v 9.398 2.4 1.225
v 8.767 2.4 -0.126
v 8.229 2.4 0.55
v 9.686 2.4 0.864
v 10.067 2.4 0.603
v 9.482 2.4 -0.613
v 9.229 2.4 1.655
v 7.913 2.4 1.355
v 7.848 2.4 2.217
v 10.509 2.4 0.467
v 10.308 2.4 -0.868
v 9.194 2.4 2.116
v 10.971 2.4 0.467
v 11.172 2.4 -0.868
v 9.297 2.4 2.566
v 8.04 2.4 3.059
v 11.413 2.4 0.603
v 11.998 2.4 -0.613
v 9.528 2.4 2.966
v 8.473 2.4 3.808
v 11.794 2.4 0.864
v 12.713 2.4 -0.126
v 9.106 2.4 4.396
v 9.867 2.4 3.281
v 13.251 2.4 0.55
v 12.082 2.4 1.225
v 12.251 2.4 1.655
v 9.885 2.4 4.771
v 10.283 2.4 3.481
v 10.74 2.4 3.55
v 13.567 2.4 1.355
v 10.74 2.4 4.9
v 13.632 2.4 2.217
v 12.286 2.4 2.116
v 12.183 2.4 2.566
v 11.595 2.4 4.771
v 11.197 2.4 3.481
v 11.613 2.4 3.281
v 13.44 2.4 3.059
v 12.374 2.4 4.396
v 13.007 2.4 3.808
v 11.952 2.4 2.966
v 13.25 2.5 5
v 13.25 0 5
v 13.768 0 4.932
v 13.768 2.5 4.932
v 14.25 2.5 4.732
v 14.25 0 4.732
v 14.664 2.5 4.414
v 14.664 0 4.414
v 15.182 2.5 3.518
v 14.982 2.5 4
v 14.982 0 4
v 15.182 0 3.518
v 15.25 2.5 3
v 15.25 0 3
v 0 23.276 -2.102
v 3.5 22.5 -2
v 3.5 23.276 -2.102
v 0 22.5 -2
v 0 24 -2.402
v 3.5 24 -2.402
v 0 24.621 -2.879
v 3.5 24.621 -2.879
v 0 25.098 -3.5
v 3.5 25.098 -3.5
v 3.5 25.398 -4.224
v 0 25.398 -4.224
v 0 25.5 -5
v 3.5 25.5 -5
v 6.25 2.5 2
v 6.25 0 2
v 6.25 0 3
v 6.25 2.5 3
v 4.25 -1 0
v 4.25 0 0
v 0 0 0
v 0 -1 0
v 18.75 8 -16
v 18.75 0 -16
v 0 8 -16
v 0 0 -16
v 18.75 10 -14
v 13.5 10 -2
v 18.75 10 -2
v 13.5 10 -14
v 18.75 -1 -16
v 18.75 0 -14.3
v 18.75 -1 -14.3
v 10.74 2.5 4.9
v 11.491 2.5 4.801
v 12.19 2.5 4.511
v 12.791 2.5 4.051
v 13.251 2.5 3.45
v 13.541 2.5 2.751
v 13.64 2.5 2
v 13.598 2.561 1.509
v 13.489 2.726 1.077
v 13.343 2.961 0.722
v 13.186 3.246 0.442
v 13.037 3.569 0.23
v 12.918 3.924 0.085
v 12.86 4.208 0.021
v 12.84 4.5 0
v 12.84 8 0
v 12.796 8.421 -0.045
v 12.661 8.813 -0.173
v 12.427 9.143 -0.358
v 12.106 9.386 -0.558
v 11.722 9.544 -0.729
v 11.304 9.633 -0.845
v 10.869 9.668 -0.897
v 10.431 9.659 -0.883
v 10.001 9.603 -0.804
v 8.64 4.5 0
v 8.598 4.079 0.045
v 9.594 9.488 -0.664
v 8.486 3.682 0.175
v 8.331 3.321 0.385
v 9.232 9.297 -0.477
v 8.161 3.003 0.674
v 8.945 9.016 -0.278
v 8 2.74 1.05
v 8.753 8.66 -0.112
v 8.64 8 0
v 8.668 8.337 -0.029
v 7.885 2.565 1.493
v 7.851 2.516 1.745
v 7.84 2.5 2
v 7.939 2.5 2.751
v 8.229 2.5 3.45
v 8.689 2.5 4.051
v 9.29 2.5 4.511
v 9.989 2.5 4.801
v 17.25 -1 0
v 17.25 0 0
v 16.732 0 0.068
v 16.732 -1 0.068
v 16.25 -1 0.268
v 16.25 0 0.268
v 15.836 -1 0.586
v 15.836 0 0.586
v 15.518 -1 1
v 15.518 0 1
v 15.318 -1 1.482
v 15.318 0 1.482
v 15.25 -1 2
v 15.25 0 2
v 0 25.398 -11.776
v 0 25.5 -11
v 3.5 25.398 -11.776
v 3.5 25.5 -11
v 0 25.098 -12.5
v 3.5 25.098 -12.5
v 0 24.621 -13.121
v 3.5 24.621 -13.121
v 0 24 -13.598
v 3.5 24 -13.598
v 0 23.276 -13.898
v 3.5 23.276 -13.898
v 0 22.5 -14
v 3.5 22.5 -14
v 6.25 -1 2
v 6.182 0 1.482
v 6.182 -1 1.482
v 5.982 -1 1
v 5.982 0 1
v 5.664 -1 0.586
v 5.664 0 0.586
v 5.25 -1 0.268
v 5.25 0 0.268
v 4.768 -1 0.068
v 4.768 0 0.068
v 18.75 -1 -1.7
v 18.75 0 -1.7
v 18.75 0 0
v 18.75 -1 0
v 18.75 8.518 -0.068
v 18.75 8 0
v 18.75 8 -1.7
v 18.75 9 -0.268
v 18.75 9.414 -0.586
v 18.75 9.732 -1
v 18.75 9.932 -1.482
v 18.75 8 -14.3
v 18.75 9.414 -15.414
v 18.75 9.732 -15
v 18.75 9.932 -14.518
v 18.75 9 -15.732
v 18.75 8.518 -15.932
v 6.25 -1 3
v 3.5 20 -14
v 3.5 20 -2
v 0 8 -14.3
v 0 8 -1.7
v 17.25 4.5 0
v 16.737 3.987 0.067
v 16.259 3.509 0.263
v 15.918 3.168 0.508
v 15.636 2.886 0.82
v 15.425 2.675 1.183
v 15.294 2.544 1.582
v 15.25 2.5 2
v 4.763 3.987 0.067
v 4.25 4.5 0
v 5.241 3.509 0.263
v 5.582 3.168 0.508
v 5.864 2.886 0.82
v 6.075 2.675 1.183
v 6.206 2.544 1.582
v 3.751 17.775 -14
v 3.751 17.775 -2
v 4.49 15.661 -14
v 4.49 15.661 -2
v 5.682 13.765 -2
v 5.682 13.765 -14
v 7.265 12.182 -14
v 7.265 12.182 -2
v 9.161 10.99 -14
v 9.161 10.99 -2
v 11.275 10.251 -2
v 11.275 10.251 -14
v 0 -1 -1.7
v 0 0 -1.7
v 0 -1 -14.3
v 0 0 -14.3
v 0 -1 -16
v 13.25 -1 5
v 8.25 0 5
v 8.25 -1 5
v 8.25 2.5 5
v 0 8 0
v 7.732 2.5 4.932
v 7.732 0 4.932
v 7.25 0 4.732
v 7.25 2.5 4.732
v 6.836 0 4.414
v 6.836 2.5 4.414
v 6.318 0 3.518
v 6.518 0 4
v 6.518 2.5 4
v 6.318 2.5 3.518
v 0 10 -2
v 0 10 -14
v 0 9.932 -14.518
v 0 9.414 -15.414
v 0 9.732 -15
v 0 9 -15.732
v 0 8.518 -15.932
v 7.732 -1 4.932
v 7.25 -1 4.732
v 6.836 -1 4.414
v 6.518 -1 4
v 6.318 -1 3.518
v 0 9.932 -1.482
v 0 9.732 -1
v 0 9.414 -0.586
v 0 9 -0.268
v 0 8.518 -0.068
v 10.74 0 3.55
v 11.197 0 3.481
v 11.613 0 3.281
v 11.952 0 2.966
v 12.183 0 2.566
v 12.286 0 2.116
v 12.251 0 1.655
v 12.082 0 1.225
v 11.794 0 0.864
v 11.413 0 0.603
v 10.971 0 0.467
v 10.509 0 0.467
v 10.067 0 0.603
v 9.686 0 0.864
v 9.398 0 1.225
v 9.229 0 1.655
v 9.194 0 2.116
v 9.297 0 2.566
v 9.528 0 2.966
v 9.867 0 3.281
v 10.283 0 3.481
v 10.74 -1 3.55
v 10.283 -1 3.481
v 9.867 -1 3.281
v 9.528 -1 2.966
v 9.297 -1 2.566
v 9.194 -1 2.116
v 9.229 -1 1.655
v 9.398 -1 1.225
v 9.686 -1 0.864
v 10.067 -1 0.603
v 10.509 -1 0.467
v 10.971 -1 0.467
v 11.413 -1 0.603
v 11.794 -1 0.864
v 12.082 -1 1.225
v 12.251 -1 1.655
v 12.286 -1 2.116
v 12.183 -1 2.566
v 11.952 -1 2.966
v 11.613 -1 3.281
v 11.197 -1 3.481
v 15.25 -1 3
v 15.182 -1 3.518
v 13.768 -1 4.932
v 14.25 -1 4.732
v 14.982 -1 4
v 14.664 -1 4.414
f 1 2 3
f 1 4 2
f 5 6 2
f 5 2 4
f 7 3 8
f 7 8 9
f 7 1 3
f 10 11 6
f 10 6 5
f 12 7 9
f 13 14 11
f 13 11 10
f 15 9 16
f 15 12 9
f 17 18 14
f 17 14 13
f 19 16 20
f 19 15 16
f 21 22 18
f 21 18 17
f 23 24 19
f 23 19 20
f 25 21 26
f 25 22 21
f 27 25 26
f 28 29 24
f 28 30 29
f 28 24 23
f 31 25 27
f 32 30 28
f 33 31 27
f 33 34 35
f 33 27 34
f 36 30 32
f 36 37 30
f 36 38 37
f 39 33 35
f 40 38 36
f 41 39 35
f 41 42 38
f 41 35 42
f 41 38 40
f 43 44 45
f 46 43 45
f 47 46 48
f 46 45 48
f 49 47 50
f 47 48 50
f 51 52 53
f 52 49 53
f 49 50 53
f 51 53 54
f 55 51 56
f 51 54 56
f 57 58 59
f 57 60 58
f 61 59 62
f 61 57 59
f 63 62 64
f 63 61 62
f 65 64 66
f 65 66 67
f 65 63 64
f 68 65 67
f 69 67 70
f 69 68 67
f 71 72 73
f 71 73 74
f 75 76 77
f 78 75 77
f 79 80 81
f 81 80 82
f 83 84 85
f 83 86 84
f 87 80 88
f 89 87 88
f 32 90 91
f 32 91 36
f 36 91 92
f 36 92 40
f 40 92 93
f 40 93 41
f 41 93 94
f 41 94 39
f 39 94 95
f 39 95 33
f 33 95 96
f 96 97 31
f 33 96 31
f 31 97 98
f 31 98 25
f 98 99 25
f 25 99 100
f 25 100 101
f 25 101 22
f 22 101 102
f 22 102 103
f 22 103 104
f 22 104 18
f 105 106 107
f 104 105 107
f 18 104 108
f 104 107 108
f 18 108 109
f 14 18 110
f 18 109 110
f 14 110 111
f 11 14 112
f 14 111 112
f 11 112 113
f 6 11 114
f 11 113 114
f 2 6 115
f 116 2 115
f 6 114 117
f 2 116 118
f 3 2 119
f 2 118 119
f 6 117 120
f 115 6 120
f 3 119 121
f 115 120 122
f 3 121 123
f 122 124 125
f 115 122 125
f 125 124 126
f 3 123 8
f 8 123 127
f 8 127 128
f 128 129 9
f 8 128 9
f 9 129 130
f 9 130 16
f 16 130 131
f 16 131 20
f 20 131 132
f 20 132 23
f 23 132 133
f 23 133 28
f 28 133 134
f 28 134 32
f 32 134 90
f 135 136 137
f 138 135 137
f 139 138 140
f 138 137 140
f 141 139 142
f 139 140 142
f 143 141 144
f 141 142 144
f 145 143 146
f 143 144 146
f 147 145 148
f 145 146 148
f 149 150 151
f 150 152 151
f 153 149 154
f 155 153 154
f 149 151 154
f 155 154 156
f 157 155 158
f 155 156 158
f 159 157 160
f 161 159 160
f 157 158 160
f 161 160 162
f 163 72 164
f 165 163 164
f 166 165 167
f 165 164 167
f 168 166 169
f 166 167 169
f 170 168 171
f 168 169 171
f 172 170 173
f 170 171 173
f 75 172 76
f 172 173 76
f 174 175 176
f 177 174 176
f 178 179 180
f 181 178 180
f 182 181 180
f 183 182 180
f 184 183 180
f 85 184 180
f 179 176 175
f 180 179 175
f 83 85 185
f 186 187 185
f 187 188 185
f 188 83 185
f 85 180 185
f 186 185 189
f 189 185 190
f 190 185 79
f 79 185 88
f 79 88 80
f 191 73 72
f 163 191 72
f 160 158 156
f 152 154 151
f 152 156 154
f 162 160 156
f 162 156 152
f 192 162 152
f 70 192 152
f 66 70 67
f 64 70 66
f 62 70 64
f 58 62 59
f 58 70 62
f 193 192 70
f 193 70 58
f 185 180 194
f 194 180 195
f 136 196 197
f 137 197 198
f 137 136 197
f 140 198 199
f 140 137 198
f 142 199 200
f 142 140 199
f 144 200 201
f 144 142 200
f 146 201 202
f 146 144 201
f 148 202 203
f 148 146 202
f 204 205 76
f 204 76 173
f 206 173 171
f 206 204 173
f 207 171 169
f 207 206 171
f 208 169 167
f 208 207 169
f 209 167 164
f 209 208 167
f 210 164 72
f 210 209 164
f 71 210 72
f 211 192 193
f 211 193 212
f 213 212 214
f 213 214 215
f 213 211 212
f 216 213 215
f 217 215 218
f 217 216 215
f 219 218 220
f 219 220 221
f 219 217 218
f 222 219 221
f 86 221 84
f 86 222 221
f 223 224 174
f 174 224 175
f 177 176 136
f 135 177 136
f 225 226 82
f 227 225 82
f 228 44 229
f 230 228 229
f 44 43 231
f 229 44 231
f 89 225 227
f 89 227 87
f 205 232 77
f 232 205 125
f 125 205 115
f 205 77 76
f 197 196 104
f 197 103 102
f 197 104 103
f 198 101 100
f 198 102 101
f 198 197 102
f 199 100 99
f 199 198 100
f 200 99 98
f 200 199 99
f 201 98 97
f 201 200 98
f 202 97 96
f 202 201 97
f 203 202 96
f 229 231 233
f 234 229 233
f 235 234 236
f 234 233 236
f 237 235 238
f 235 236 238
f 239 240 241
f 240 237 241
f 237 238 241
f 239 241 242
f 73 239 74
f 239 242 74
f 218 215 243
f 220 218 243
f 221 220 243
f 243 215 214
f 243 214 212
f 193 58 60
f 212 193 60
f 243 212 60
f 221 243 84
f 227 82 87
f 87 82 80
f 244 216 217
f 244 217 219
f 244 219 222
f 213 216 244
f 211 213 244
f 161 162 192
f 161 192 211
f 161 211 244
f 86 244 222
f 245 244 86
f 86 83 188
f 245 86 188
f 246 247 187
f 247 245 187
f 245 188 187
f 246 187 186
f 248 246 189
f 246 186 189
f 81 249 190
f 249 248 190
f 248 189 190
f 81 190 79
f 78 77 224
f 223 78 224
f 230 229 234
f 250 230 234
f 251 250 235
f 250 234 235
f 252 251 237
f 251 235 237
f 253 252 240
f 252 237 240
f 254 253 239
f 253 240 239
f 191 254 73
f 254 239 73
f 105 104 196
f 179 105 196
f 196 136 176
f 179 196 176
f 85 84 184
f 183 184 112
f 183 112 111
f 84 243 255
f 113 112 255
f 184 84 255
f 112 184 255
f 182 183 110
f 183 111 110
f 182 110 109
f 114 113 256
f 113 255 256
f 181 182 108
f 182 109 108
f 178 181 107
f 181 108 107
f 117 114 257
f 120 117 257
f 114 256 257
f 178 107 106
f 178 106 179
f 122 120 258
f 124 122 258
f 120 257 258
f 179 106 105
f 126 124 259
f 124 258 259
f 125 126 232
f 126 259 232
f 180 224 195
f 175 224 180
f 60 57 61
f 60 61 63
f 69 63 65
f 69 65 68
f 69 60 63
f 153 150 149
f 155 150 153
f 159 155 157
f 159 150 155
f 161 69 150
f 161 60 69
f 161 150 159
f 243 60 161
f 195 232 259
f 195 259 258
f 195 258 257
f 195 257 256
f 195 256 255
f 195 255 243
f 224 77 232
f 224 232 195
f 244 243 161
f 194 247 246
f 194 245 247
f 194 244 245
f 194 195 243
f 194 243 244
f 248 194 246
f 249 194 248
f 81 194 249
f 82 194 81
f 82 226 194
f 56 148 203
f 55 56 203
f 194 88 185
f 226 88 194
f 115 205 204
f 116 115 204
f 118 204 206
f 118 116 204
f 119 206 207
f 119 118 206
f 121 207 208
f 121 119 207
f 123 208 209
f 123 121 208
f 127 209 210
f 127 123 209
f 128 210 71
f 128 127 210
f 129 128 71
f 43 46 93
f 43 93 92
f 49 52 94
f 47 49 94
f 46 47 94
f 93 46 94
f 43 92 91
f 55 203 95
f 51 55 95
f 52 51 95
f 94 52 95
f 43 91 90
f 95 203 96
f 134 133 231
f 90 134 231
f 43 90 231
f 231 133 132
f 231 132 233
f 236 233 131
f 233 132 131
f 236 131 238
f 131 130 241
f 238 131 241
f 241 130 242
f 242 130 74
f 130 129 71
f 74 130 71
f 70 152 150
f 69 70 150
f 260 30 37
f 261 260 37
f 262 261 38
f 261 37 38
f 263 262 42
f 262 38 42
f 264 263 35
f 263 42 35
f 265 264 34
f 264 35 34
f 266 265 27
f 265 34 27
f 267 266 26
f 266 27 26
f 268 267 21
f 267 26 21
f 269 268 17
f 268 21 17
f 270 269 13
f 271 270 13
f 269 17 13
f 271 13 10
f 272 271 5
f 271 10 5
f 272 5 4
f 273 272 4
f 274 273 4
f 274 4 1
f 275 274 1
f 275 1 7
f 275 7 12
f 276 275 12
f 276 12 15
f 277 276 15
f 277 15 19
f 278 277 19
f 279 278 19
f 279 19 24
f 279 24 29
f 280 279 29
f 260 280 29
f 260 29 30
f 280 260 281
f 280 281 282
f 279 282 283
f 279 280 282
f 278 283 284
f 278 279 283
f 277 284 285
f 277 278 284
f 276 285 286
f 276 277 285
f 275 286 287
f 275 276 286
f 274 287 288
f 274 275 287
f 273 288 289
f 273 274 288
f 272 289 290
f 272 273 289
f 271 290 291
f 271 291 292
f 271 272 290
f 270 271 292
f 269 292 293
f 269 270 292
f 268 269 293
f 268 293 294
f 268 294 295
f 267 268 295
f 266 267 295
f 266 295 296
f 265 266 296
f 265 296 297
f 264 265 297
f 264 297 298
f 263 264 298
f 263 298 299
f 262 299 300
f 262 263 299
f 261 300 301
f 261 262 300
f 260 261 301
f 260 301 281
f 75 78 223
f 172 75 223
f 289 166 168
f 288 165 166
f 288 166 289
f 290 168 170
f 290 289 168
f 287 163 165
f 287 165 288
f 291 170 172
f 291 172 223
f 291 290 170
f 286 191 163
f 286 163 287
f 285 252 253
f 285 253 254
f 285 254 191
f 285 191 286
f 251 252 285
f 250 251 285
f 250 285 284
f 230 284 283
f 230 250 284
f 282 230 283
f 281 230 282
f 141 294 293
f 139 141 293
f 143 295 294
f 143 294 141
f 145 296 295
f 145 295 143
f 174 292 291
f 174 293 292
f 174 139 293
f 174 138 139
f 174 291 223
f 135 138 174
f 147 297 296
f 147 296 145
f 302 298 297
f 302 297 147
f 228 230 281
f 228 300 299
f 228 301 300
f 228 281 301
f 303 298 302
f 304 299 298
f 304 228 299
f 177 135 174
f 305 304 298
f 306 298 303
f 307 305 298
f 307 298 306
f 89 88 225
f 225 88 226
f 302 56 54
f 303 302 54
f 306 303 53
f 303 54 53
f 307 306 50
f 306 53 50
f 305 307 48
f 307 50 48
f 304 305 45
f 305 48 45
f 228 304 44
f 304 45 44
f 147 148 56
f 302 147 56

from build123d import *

# Parameters (mm, degrees)
SALIENTE_EXTRUIR1_DEPTH = 10
CORTAR_EXTRUIR1_DEPTH   = 8
CROQUIS3_W              = 9
CROQUIS3_H              = 2.5
SALIENTE_EXTRUIR2_DEPTH = 5
CROQUIS4_R              = 1.5499999999999994
CORTAR_EXTRUIR2_DEPTH   = 2.5
REDONDEO1_R             = 2
CROQUIS5_R              = 2.9
CORTAR_EXTRUIR3_DEPTH   = 7.6
SALIENTE_EXTRUIR3_DEPTH = 15.5
REDONDEO2_R             = 10
REDONDEO3_R             = 3
CROQUIS8_R              = 1.5499999999999994
SALIENTE_EXTRUIR5_DEPTH = 1
CROQUIS9_W              = 5
CROQUIS9_H              = 1.700000000000001
CORTAR_EXTRUIR4_DEPTH   = 36.46565245064583


with BuildPart() as part:
    # Croquis1 → Saliente-Extruir1 (new body)
    with BuildSketch(Plane(origin=(0, 0, 0), x_dir=(1, 0, 0), z_dir=(0, 1, 0))):
        Polygon((0, 0), (18.75, 0), (18.749999999999996, 16), (-3.47e-15, 16), align=None)
    extrude(amount=SALIENTE_EXTRUIR1_DEPTH)

    # Croquis2 → Cortar-Extruir1 (cut)
    with BuildSketch(Plane.XZ):
        Polygon((0, -1.7000000000000002), (18.749999999999993, -1.6999999999999997), (18.749999999999996, -14.3), (1.51e-15, -14.3), align=None)
    extrude(amount=-CORTAR_EXTRUIR1_DEPTH, mode=Mode.SUBTRACT)

    # Croquis3 → Saliente-Extruir2 (add)
    with BuildSketch(Plane.XY):
        with Locations((10.750000000000002, 1.25)):
            Rectangle(CROQUIS3_W, CROQUIS3_H)
    extrude(amount=SALIENTE_EXTRUIR2_DEPTH)

    # Croquis4 → Cortar-Extruir2 (cut)
    with BuildSketch(Plane(origin=(0, 2.5, 0), x_dir=(1, 0, 0), z_dir=(0, 1, 0))):
        with Locations(Location((10.74, -2, 0), (0, 0, 270))):
            Circle(CROQUIS4_R)
    extrude(amount=-CORTAR_EXTRUIR2_DEPTH, mode=Mode.SUBTRACT)

    # Redondeo1
    # the kernel refuses this fillet: 2 mm, written as the material it adds along each edge
    with BuildSketch(Plane(origin=(6.25, 2.5, 0), x_dir=(-1, 0, 0), z_dir=(0, -1, 0))) as redondeo1_piece_1:
        with BuildLine():
            CenterArc((REDONDEO1_R, -REDONDEO1_R), REDONDEO1_R, 90, 90)
            Line((0, -REDONDEO1_R), (0, 0))
            Line((0, 0), (REDONDEO1_R, 0))
        make_face()
    extrude(amount=2.5)
    with BuildSketch(Plane(origin=(15.25, 0, 0), x_dir=(1, 0, 0), z_dir=(0, 1, 0))) as redondeo1_piece_2:
        with BuildLine():
            CenterArc((REDONDEO1_R, -REDONDEO1_R), REDONDEO1_R, 90, 90)
            Line((0, -REDONDEO1_R), (0, 0))
            Line((0, 0), (REDONDEO1_R, 0))
        make_face()
    extrude(amount=2.5)
    with BuildSketch(Plane(origin=(15.25, 2.5, 0), x_dir=(0, 1, 0), z_dir=(-1, 0, 0))) as redondeo1_piece_3_section:
        with BuildLine():
            CenterArc((REDONDEO1_R, -REDONDEO1_R), REDONDEO1_R, 90, 90)
            Line((0, -REDONDEO1_R), (0, 0))
            Line((0, 0), (REDONDEO1_R, 0))
        make_face()
    redondeo1_piece_3 = extrude(amount=9, mode=Mode.PRIVATE)
    redondeo1_piece_3 = redondeo1_piece_3 - Plane(origin=(10.74, 2.981912580650479, 2), x_dir=(-1.8e-16, 0, 1), z_dir=(0, 1, 0)) * Cylinder(1.5499999999999994, 26, mode=Mode.PRIVATE)
    add(redondeo1_piece_3)
    with BuildSketch(Plane(origin=(6.25, 7.5, 0), x_dir=(-1, 0, 0), z_dir=(0, -1, 0))) as redondeo1_piece_4a_section:
        with BuildLine():
            CenterArc((REDONDEO1_R, -REDONDEO1_R), REDONDEO1_R, 90, 90)
            Line((0, -REDONDEO1_R), (0, 0))
            Line((0, 0), (REDONDEO1_R, 0))
        make_face()
    redondeo1_piece_4a = extrude(amount=7.5, mode=Mode.PRIVATE)
    redondeo1_piece_4a = split(redondeo1_piece_4a, bisect_by=Plane(origin=(5.797209771466349, 2.5, 0.45279022853365075), z_dir=(0, 1, 0)), keep=Keep.TOP, mode=Mode.PRIVATE)
    with BuildSketch(Plane(origin=(15.25, 2.5, 0), x_dir=(0, 1, 0), z_dir=(-1, 0, 0))) as redondeo1_piece_4b_section:
        with BuildLine():
            CenterArc((REDONDEO1_R, -REDONDEO1_R), REDONDEO1_R, 90, 90)
            Line((0, -REDONDEO1_R), (0, 0))
            Line((0, 0), (REDONDEO1_R, 0))
        make_face()
    redondeo1_piece_4b = extrude(amount=14, mode=Mode.PRIVATE)
    redondeo1_piece_4b = split(redondeo1_piece_4b, bisect_by=Plane(origin=(6.25, 2.952790228533651, 0.45279022853365075), z_dir=(-1, 0, 0)), keep=Keep.TOP, mode=Mode.PRIVATE)
    redondeo1_piece_4 = redondeo1_piece_4a & redondeo1_piece_4b
    add(redondeo1_piece_4)
    with BuildSketch(Plane(origin=(20.25, 2.5, 0), x_dir=(0, 1, 0), z_dir=(-1, 0, 0))) as redondeo1_piece_5a_section:
        with BuildLine():
            CenterArc((REDONDEO1_R, -REDONDEO1_R), REDONDEO1_R, 90, 90)
            Line((0, -REDONDEO1_R), (0, 0))
            Line((0, 0), (REDONDEO1_R, 0))
        make_face()
    redondeo1_piece_5a = extrude(amount=14, mode=Mode.PRIVATE)
    redondeo1_piece_5a = split(redondeo1_piece_5a, bisect_by=Plane(origin=(18.75, 2.952790228533651, 0.45279022853365036), z_dir=(-1, 0, 2.2e-16)), keep=Keep.TOP, mode=Mode.PRIVATE)
    redondeo1_piece_5a = split(redondeo1_piece_5a, bisect_by=Plane(origin=(15.25, 2.952790228533651, 0.45279022853365075), z_dir=(1, 0, 0)), keep=Keep.TOP, mode=Mode.PRIVATE)
    with BuildSketch(Plane(origin=(15.25, 0, 0), x_dir=(1, 0, 0), z_dir=(0, 1, 0))) as redondeo1_piece_5b_section:
        with BuildLine():
            CenterArc((REDONDEO1_R, -REDONDEO1_R), REDONDEO1_R, 90, 90)
            Line((0, -REDONDEO1_R), (0, 0))
            Line((0, 0), (REDONDEO1_R, 0))
        make_face()
    redondeo1_piece_5b = extrude(amount=7.5, mode=Mode.PRIVATE)
    redondeo1_piece_5b = split(redondeo1_piece_5b, bisect_by=Plane(origin=(15.70279022853365, 2.5, 0.45279022853364964), z_dir=(0, 1, 0)), keep=Keep.TOP, mode=Mode.PRIVATE)
    redondeo1_piece_5 = redondeo1_piece_5a & redondeo1_piece_5b
    add(redondeo1_piece_5)
    # the kernel refuses this fillet: 2 mm, written as the material it takes off along each edge
    with BuildSketch(Plane(origin=(23.749999999999996, 10, -16), x_dir=(0, -1, 0), z_dir=(-1, 0, 0))) as redondeo1_2_piece_1:
        with BuildLine():
            CenterArc((REDONDEO1_R, REDONDEO1_R), REDONDEO1_R, 180, 90)
            Line((0, REDONDEO1_R), (0, 0))
            Line((0, 0), (REDONDEO1_R, 0))
        make_face()
    extrude(amount=28.75, mode=Mode.SUBTRACT)
    with BuildSketch(Plane(origin=(6.25, 7.5, 5), x_dir=(0, 0, -1), z_dir=(0, -1, 0))) as redondeo1_2_piece_2:
        with BuildLine():
            CenterArc((REDONDEO1_R, REDONDEO1_R), REDONDEO1_R, 180, 90)
            Line((0, REDONDEO1_R), (0, 0))
            Line((0, 0), (REDONDEO1_R, 0))
        make_face()
    extrude(amount=12.5, mode=Mode.SUBTRACT)
    with BuildSketch(Plane(origin=(15.25, -5, 5), x_dir=(0, 0, -1), z_dir=(0, 1, 0))) as redondeo1_2_piece_3:
        with BuildLine():
            CenterArc((REDONDEO1_R, REDONDEO1_R), REDONDEO1_R, 180, 90)
            Line((0, REDONDEO1_R), (0, 0))
            Line((0, 0), (REDONDEO1_R, 0))
        make_face()
    extrude(amount=12.5, mode=Mode.SUBTRACT)
    with BuildSketch(Plane(origin=(-5, 10, 0), x_dir=(0, -1, 0), z_dir=(1, 0, 0))) as redondeo1_2_piece_4:
        with BuildLine():
            CenterArc((REDONDEO1_R, REDONDEO1_R), REDONDEO1_R, 180, 90)
            Line((0, REDONDEO1_R), (0, 0))
            Line((0, 0), (REDONDEO1_R, 0))
        make_face()
    extrude(amount=28.75, mode=Mode.SUBTRACT)

    # Croquis5 → Cortar-Extruir3 (cut)
    with BuildSketch(Plane(origin=(0, 10, 0), x_dir=(1, 0, 0), z_dir=(0, 1, 0))):
        with Locations(Location((10.74, -2, 0), (0, 0, 270))):
            Circle(CROQUIS5_R)
    extrude(amount=-CORTAR_EXTRUIR3_DEPTH, mode=Mode.SUBTRACT)

    # Croquis6 → Saliente-Extruir3 (add)
    with BuildSketch(Plane(origin=(0, 10, 0), x_dir=(1, 0, 0), z_dir=(0, 1, 0))):
        Polygon((-3.04e-15, 14), (3.499999999999997, 14), (3.4999999999999982, 2), (-3.04e-15, 2), align=None)
    extrude(amount=SALIENTE_EXTRUIR3_DEPTH)

    # Redondeo2
    # the kernel refuses this fillet: 10 mm, written as the material it adds along each edge
    with BuildSketch(Plane(origin=(3.499999999999997, 10, -14), x_dir=(1, 0, -1.1e-16), z_dir=(1.1e-16, 0, 1))) as redondeo2_piece_1:
        with BuildLine():
            CenterArc((REDONDEO2_R, REDONDEO2_R), REDONDEO2_R, 180, 90)
            Line((-2.22e-15, REDONDEO2_R), (0, 0))
            Line((0, 0), (REDONDEO2_R, 0))
        make_face()
    extrude(amount=12)

    # Redondeo3
    redondeo3_edges = [part.edges().sort_by_distance(p)[0] for p in [
        (1.7499999999999976, 25.5, -2),
        (1.749999999999997, 25.5, -14),
    ]]
    fillet(redondeo3_edges, radius=REDONDEO3_R)

    # Croquis8 → Saliente-Extruir5 (add)
    # profile 1 of 2: a face of its own
    with BuildSketch(Plane.XZ):
        with BuildLine():
            Line((13.25, 5), (8.25, 5))
            ThreePointArc((8.25, 5), (6.835786437626905, 4.414213562373095), (6.25, 3.0000000000000004))
            Line((6.25, 3.0000000000000004), (6.25, 2))
            ThreePointArc((6.25, 2), (5.664213562373095, 0.5857864376269051), (4.25, 0))
            Line((4.25, 0), (-5, 1.08e-15))
            Line((-5, 1.08e-15), (-5, -1.699999999999999))
            Line((-5, -1.699999999999999), (18.749999999999993, -1.6999999999999997))
            Line((18.749999999999993, -1.6999999999999997), (18.75, 0))
            Line((18.75, 0), (17.25, 0))
            ThreePointArc((17.25, 0), (15.835786437626904, 0.5857864376269051), (15.25, 2.0000000000000004))
            Line((15.25, 2.0000000000000004), (15.25, 3))
            ThreePointArc((15.25, 3), (14.664213562373096, 4.414213562373095), (13.25, 5))
        make_face()
        with Locations(Location((10.74, 2, 0), (0, 0, 90))):
            Circle(CROQUIS8_R, mode=Mode.SUBTRACT)
    # profile 2 of 2: a face of its own
    with BuildSketch(Plane.XZ):
        Polygon((18.749999999999996, -14.3), (-5.0000000000000036, -14.299999999999999), (-5.0000000000000036, -16), (18.749999999999996, -16), align=None)
    extrude(amount=SALIENTE_EXTRUIR5_DEPTH)

    # Croquis9 → Cortar-Extruir4 (cut, through all)
    with BuildSketch(Plane(origin=(0, 0, 0), x_dir=(1, 0, 0), z_dir=(0, 1, 0))):
        with Locations((-2.5000000000000036, 15.149999999999999)):
            Rectangle(CROQUIS9_W, CROQUIS9_H)
        Polygon((-5, -1.08e-15), (0, 0), (0, 1.7000000000000002), (-5, 1.699999999999999), align=None)
    extrude(amount=-CORTAR_EXTRUIR4_DEPTH, mode=Mode.SUBTRACT)


solid = part.part
